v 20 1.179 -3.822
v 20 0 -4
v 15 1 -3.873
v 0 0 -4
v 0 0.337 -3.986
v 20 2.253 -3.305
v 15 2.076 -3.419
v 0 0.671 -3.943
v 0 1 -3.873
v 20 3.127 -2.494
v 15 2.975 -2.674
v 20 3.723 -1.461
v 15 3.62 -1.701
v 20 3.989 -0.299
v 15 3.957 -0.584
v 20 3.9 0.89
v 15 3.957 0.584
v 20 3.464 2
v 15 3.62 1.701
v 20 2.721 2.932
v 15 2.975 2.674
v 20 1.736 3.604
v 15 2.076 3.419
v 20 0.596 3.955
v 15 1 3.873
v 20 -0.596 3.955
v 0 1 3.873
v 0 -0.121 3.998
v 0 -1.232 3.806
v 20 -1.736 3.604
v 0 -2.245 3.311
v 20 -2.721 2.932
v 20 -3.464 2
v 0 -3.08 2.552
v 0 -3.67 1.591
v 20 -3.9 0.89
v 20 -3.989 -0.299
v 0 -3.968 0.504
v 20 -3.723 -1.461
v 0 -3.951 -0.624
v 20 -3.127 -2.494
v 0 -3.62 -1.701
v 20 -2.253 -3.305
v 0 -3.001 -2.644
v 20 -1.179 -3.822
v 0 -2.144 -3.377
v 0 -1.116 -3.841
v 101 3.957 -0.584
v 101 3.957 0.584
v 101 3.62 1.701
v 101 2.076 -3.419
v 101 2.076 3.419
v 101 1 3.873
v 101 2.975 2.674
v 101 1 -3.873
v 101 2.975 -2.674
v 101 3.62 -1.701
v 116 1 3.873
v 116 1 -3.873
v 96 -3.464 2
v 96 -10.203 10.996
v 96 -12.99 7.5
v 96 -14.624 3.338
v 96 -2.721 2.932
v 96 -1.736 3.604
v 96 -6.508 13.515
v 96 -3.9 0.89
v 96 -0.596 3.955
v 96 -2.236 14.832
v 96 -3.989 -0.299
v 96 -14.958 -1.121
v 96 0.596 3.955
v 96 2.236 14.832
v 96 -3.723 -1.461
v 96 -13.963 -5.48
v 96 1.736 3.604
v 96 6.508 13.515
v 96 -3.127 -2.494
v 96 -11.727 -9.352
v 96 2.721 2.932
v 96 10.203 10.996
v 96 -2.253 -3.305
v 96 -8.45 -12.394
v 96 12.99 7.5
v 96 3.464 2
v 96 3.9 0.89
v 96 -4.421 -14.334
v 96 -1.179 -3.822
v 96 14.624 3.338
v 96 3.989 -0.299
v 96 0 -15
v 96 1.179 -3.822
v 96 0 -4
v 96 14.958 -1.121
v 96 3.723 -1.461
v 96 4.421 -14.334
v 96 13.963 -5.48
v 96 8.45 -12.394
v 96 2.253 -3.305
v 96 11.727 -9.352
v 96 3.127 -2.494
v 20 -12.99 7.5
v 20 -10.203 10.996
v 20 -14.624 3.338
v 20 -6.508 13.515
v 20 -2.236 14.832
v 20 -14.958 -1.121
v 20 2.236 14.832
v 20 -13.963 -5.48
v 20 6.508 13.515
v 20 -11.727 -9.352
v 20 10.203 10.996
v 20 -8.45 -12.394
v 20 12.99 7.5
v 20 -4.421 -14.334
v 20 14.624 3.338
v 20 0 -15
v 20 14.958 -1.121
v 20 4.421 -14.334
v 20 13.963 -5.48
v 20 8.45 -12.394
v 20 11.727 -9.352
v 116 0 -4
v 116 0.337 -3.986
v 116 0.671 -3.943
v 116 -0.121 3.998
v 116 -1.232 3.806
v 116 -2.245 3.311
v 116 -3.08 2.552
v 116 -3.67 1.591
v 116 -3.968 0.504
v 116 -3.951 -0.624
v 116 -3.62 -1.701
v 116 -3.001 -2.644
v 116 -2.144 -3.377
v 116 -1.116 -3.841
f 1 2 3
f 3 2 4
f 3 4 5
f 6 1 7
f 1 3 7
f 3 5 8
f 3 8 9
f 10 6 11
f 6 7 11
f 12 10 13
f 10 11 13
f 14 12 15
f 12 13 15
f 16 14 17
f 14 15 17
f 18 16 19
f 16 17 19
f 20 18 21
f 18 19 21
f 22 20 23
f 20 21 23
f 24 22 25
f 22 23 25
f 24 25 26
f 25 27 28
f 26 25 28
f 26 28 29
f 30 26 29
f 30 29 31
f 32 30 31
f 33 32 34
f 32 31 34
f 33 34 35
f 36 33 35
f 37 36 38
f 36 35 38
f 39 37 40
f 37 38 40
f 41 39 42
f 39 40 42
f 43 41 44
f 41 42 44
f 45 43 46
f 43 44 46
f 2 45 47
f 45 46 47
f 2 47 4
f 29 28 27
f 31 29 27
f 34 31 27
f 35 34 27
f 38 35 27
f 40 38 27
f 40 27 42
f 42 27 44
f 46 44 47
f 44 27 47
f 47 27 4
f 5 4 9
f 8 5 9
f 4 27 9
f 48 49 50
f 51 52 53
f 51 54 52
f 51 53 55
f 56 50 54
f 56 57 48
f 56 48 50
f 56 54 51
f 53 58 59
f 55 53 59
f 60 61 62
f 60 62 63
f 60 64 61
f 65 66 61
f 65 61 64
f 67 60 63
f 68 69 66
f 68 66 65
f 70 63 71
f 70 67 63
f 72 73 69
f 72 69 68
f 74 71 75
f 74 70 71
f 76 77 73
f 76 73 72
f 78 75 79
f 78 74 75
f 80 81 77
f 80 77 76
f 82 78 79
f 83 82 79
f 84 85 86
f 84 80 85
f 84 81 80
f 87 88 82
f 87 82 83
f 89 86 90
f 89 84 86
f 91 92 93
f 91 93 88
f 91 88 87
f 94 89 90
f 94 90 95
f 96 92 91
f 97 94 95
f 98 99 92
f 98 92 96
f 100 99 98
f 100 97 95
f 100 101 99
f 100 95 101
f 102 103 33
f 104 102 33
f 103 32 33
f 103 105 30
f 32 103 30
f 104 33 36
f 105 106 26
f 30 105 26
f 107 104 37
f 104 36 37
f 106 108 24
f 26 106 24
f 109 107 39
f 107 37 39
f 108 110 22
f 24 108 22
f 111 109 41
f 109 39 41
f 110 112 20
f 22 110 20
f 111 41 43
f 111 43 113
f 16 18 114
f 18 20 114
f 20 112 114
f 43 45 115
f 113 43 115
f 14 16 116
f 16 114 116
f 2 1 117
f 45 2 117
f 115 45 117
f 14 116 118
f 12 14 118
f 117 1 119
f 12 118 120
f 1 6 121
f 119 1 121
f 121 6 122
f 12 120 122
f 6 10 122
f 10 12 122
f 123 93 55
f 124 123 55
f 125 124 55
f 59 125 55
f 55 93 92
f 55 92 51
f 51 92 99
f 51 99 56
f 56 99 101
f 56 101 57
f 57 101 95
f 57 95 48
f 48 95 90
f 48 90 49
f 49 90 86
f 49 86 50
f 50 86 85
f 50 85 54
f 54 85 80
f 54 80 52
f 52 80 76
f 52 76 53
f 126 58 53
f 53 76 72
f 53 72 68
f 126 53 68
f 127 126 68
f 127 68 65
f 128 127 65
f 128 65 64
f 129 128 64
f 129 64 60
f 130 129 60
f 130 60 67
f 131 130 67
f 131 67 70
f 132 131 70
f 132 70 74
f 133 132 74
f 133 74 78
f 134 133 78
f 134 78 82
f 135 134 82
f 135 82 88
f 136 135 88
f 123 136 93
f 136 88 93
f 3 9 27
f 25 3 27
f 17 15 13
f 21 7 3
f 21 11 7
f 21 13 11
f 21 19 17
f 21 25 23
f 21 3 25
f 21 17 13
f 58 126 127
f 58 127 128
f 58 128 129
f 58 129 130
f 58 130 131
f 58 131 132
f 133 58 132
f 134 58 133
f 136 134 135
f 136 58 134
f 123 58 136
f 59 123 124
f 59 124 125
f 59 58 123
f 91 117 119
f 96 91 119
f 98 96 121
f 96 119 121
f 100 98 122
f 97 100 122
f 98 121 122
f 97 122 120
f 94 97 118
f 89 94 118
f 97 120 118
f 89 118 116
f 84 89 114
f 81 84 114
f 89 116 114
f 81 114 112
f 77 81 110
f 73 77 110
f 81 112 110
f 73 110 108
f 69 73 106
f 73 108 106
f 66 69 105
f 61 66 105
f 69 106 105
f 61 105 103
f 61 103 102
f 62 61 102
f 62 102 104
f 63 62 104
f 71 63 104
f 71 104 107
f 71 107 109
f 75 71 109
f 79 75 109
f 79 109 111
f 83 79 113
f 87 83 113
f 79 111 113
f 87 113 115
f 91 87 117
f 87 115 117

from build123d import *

# Parameters (mm, degrees)
ESBO_O8_R                = 4
RESSALTO_EXTRUS_O4_DEPTH = 20
ESBO_O9_R                = 15
RESSALTO_EXTRUS_O5_DEPTH = 76
ESBO_O10_R               = 4
RESSALTO_EXTRUS_O6_DEPTH = 20
ESBO_O11_W               = 14.978284248
ESBO_O11_H               = 3
CORTE_EXTRUS_O1_DEPTH    = 15
ESBO_O12_W               = 14.281633968
ESBO_O12_H               = 3
CORTE_EXTRUS_O2_DEPTH    = 15


with BuildPart() as part:
    # Esboço8 → Ressalto-extrusão4 (new body)
    with BuildSketch(Plane(origin=(0, 0, 0), x_dir=(0, 0, -1), z_dir=(1, 0, 0))):
        Circle(ESBO_O8_R)
    extrude(amount=RESSALTO_EXTRUS_O4_DEPTH)

    # Esboço9 → Ressalto-extrusão5 (add)
    with BuildSketch(Plane(origin=(20, 0, 0), x_dir=(0, 0, -1), z_dir=(1, 0, 0))):
        Circle(ESBO_O9_R)
    extrude(amount=RESSALTO_EXTRUS_O5_DEPTH)

    # Esboço10 → Ressalto-extrusão6 (add)
    with BuildSketch(Plane(origin=(96, 0, 0), x_dir=(0, 0, -1), z_dir=(1, 0, 0))):
        Circle(ESBO_O10_R)
    extrude(amount=RESSALTO_EXTRUS_O6_DEPTH)

    # Esboço11 → Corte-extrusão1 (cut)
    with BuildSketch(Plane.ZY):
        with Locations((-0.140546903, 2.5)):
            Rectangle(ESBO_O11_W, ESBO_O11_H)
    extrude(amount=-CORTE_EXTRUS_O1_DEPTH, mode=Mode.SUBTRACT)

    # Esboço12 → Corte-extrusão2 (cut)
    with BuildSketch(Plane(origin=(116, 0, 0), x_dir=(0, 0, -1), z_dir=(1, 0, 0))):
        with Locations((0.158049163, 2.5)):
            Rectangle(ESBO_O12_W, ESBO_O12_H)
    extrude(amount=-CORTE_EXTRUS_O2_DEPTH, mode=Mode.SUBTRACT)


solid = part.part
